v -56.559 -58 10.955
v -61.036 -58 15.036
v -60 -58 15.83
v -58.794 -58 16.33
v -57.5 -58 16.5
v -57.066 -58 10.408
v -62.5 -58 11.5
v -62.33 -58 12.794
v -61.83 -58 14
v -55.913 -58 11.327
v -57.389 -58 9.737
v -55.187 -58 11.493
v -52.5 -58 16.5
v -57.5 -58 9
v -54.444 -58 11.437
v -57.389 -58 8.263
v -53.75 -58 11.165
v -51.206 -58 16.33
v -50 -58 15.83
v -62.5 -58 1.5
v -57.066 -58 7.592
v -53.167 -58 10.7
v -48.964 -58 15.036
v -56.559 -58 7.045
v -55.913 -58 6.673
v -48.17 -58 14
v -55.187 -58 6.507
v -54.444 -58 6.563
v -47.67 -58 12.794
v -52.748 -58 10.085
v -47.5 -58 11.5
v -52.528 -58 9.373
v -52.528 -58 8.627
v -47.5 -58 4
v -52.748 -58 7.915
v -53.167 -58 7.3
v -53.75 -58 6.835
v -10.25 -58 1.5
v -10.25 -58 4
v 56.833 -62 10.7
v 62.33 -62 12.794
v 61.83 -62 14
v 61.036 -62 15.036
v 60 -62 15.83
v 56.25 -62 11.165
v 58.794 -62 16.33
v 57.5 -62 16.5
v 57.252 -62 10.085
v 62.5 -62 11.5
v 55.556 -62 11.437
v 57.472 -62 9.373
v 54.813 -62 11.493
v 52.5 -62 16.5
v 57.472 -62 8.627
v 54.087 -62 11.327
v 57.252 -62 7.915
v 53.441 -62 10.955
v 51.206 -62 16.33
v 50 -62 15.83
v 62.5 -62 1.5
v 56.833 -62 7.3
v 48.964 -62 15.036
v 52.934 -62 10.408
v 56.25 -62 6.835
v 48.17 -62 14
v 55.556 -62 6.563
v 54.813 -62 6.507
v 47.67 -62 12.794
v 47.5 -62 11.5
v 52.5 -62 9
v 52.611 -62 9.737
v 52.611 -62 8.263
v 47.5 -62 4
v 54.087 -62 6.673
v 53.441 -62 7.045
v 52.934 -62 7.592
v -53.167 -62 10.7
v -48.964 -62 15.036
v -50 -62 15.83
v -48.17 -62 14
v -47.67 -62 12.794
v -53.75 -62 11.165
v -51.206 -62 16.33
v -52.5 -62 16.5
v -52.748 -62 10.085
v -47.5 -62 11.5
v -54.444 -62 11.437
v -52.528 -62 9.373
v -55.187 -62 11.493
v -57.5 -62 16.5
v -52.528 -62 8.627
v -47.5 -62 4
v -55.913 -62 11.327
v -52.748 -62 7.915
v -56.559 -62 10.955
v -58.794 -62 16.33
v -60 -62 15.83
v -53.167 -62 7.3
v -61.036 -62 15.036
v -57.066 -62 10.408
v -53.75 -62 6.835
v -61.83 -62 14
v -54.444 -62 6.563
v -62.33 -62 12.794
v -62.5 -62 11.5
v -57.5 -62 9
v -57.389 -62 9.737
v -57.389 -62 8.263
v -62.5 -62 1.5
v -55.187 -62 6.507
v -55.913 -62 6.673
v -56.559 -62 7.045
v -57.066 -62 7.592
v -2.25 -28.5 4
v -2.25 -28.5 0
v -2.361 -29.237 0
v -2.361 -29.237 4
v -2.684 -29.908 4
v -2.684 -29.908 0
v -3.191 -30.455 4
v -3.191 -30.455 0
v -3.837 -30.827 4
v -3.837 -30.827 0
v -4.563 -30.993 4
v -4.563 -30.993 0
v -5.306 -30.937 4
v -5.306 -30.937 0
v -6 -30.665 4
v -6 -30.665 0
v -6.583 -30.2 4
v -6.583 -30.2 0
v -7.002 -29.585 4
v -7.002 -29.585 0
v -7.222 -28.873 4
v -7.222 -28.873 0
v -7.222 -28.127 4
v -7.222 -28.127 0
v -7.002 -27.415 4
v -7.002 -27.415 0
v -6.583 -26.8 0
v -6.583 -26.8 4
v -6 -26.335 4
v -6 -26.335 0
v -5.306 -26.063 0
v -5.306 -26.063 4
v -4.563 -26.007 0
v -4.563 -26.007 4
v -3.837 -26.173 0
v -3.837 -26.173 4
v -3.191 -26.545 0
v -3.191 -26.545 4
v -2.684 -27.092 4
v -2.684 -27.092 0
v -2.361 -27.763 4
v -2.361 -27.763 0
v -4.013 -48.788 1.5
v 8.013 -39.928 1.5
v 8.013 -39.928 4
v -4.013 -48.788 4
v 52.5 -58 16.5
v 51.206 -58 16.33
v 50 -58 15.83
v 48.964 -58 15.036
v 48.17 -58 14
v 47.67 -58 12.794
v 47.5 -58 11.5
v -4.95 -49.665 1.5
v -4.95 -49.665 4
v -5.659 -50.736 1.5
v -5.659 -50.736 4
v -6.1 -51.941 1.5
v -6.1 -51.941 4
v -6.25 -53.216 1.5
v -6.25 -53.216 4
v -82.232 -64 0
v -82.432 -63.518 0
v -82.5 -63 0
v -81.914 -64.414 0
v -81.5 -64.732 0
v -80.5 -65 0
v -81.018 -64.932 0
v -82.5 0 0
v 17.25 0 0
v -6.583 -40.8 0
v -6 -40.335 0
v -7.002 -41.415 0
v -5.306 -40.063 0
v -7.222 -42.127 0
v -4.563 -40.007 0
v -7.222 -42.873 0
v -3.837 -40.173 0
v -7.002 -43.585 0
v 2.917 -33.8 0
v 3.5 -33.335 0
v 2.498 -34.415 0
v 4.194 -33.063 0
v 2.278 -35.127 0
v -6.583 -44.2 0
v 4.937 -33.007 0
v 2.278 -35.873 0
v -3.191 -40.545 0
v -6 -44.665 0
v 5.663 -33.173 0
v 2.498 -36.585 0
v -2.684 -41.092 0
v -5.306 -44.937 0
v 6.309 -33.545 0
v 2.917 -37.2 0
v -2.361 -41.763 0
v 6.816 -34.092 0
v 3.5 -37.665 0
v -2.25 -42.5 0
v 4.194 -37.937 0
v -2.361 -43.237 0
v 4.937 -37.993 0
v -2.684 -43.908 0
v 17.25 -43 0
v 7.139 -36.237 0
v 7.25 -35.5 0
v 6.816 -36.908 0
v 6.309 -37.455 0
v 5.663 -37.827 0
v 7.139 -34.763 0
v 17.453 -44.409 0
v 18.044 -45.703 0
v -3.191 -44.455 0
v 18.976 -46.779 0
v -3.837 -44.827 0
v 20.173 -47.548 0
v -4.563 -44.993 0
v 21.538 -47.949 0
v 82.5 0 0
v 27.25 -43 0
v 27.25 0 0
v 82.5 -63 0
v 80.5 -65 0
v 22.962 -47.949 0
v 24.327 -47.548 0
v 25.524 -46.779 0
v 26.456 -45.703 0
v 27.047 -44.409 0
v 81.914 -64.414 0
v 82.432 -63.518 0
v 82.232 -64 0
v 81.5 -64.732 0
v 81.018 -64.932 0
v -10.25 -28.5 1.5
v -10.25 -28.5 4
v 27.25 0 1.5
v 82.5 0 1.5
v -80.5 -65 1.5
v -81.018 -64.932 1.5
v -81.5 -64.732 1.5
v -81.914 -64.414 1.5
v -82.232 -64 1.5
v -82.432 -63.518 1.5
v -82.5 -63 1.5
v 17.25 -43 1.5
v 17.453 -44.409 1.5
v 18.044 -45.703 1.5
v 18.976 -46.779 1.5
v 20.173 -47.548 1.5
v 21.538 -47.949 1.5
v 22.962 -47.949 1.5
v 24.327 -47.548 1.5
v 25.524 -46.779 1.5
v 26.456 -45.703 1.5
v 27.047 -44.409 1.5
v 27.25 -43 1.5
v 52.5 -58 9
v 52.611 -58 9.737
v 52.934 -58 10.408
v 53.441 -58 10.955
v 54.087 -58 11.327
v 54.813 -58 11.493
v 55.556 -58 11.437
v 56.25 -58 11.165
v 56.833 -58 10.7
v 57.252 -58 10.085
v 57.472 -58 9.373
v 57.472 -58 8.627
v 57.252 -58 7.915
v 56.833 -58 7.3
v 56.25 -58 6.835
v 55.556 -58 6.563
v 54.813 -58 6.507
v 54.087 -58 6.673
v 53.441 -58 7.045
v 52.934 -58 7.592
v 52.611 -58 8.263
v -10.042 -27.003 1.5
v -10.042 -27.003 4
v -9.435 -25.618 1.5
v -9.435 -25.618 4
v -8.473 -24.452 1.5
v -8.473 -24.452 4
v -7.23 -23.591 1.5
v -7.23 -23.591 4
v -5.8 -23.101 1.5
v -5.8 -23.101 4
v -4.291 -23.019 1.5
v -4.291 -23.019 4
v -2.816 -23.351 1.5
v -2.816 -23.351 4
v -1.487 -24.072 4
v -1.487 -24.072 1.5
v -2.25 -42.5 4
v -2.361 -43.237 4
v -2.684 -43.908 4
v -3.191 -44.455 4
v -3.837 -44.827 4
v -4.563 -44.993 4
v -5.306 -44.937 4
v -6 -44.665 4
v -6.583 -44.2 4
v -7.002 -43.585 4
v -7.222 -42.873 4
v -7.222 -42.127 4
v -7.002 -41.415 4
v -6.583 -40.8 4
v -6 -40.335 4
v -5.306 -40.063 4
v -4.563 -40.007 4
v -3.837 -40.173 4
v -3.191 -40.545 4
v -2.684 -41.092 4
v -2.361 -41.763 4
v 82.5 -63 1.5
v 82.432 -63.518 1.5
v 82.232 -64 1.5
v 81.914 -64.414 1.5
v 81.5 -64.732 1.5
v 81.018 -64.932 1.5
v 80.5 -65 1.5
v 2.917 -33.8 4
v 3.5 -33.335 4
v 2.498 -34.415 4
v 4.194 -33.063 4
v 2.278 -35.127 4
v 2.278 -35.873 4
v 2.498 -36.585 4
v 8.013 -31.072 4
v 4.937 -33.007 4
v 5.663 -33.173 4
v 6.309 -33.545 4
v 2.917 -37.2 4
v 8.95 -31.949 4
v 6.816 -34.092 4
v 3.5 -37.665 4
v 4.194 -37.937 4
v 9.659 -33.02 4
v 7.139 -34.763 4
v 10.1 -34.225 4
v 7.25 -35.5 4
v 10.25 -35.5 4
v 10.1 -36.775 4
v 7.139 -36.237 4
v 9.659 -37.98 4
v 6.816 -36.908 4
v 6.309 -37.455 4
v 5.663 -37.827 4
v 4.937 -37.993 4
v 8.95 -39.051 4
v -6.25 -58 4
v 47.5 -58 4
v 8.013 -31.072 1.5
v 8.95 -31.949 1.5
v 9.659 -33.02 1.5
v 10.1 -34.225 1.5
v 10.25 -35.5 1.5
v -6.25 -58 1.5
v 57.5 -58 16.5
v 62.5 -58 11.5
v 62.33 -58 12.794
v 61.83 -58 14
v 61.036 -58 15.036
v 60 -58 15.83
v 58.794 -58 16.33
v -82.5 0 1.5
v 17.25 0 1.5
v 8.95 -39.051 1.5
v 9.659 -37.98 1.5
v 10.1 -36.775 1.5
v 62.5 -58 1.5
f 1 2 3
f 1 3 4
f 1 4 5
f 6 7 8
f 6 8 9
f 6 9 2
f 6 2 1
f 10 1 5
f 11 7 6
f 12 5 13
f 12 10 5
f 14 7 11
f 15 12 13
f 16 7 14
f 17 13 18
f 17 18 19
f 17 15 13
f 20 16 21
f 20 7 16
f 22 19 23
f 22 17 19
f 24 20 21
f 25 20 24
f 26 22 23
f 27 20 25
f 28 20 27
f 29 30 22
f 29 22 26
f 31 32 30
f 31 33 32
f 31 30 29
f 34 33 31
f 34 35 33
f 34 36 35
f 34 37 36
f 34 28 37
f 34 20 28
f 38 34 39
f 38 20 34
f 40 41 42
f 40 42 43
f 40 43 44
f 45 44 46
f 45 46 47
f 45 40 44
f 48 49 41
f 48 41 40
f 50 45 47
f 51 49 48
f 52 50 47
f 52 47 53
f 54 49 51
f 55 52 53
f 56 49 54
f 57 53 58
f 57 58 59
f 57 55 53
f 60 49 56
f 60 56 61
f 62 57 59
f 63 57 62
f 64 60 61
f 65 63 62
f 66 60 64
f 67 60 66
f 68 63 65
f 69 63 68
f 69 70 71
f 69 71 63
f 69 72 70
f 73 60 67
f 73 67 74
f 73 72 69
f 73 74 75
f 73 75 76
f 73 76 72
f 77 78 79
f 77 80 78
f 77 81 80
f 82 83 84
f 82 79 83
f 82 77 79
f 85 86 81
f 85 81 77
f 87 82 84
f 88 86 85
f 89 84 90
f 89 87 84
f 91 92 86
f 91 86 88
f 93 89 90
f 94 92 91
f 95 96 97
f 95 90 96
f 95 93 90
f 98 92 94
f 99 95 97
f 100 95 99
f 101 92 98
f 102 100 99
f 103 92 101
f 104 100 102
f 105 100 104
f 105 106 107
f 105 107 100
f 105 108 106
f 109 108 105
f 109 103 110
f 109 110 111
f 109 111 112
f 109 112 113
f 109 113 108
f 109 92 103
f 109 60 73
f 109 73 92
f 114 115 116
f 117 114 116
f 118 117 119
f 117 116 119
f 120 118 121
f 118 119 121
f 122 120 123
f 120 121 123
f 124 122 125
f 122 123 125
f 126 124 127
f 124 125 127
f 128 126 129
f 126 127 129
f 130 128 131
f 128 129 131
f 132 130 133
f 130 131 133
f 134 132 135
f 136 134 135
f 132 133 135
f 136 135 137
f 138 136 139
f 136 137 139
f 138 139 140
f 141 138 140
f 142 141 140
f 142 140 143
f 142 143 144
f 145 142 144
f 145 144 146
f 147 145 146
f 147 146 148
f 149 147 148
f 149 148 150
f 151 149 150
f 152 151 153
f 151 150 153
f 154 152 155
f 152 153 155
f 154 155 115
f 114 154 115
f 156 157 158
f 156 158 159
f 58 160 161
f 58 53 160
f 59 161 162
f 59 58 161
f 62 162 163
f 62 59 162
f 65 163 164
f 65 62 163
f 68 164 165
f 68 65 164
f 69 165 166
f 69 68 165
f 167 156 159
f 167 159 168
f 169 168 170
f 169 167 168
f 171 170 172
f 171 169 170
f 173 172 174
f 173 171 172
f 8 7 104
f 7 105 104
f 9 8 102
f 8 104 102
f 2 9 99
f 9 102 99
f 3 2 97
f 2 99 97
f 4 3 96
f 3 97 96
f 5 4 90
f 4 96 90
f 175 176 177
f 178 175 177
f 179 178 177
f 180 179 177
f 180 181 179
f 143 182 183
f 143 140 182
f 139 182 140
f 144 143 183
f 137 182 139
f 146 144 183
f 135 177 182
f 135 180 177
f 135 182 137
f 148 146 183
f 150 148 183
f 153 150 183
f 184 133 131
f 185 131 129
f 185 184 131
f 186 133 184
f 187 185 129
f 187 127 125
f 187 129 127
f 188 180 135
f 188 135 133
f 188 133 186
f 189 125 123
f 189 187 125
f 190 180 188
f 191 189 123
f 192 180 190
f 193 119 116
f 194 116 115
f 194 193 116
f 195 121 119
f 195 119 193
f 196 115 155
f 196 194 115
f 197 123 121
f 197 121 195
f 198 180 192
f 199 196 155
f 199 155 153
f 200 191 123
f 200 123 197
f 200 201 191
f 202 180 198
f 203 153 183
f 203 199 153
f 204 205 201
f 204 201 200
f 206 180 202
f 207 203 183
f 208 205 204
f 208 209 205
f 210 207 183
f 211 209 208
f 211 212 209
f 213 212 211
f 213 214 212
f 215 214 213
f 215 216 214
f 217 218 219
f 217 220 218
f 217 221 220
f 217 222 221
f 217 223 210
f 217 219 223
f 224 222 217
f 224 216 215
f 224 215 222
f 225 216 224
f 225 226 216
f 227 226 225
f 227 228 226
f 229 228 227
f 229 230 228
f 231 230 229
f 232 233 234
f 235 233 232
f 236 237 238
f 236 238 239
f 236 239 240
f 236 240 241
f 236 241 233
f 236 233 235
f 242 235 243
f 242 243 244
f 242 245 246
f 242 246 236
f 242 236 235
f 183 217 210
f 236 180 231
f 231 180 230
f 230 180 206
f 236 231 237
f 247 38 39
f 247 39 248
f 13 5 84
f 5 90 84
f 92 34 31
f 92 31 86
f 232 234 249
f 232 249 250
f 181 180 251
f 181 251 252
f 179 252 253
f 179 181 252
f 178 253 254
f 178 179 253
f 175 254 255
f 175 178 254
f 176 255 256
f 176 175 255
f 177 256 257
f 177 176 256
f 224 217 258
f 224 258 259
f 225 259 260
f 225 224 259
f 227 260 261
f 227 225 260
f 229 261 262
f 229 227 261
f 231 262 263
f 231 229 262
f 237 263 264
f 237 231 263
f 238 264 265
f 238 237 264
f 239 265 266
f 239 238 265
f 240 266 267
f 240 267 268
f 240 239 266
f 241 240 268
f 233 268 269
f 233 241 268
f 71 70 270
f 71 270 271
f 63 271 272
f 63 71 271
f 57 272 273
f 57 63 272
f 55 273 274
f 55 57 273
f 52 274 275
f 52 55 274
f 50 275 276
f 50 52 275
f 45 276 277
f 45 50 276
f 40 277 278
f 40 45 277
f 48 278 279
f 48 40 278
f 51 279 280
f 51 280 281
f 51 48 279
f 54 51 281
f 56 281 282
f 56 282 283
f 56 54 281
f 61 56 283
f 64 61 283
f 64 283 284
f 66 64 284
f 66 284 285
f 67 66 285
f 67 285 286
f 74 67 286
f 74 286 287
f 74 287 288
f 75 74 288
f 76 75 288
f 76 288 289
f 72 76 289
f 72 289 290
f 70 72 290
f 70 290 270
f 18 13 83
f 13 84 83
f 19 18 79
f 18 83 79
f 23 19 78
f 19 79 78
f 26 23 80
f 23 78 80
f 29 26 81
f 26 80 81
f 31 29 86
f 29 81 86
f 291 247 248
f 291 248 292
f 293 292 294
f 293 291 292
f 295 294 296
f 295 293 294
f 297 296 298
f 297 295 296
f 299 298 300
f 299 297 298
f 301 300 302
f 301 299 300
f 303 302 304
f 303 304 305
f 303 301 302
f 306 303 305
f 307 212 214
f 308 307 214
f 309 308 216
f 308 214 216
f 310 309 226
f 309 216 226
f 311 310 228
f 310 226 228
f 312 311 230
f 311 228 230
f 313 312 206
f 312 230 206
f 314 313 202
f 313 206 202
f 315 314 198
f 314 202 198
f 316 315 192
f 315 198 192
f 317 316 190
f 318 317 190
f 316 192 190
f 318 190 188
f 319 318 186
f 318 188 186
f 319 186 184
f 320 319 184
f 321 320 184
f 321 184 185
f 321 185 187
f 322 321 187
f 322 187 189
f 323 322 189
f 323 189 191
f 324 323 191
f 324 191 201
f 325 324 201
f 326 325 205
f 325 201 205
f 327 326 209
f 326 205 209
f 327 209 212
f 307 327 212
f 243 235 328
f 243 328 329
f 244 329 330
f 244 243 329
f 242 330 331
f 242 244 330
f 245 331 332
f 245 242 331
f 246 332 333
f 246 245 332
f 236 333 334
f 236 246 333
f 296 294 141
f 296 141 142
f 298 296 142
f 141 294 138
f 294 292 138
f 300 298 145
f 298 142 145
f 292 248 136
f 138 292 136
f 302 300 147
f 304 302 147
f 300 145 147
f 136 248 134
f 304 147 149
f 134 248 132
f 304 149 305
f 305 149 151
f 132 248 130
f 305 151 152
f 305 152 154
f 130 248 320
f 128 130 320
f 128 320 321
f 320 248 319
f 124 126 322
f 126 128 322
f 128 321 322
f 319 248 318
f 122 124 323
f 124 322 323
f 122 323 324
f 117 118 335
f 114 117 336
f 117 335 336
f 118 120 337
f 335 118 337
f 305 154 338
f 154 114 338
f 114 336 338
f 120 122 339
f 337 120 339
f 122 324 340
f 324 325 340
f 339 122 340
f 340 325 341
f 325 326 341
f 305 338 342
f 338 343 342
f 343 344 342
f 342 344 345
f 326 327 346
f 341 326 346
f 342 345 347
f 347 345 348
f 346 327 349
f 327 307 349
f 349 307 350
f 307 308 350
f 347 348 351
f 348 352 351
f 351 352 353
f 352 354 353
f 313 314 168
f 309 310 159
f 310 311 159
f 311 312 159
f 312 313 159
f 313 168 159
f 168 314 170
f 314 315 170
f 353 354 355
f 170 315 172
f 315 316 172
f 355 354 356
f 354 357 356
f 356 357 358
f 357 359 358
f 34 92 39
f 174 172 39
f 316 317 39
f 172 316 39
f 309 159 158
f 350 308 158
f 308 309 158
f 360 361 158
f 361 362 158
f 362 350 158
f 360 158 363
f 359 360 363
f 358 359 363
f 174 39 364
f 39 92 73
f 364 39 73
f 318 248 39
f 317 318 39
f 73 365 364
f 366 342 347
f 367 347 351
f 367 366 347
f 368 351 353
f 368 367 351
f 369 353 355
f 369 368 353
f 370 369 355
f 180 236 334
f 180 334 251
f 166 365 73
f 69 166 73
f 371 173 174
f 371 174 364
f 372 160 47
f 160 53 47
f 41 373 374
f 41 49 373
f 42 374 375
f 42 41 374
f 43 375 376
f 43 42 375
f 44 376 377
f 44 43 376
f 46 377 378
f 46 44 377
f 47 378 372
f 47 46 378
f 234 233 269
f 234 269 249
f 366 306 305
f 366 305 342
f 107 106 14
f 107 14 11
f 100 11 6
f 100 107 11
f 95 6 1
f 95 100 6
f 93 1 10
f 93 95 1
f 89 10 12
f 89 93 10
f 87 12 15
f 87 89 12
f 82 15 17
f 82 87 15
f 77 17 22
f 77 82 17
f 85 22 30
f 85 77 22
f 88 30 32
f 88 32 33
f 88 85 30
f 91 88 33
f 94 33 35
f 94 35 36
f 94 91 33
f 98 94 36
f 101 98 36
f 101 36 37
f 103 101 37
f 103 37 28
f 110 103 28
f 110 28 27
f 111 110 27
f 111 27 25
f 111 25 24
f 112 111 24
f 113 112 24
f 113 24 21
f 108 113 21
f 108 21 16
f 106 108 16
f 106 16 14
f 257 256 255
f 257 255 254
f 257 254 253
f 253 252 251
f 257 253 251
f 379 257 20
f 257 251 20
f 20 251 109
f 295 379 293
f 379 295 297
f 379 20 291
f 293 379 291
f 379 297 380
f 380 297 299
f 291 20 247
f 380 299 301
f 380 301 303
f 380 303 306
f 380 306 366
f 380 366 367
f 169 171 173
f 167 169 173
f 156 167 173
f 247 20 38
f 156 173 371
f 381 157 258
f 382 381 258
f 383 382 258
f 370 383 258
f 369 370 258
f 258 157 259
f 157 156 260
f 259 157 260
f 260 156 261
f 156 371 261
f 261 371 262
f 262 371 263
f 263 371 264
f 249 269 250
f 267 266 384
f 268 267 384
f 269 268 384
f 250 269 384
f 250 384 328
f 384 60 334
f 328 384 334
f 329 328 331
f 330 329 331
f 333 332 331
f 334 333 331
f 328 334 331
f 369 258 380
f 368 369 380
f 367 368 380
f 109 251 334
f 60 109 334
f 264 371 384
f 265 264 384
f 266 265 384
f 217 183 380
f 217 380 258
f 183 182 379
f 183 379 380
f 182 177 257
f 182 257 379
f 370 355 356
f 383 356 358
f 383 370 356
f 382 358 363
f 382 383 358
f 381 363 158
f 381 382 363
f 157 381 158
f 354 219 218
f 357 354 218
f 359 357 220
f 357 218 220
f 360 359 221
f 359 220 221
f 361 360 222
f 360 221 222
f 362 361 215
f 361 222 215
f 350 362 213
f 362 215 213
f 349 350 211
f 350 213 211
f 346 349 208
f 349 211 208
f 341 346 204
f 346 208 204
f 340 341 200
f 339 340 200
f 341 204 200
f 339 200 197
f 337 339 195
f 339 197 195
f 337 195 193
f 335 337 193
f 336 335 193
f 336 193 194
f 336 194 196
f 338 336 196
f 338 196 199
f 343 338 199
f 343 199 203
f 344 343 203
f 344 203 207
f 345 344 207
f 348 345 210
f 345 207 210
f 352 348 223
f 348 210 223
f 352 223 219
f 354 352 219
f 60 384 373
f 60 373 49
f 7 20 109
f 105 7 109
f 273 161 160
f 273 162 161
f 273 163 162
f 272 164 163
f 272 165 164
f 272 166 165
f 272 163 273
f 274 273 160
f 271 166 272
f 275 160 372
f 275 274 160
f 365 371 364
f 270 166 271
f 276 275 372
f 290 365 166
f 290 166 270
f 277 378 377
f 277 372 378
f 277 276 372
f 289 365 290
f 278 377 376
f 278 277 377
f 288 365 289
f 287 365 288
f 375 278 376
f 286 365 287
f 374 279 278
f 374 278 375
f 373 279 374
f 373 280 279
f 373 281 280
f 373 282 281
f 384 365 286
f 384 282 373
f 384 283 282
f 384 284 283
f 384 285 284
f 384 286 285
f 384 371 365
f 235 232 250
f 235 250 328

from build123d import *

# Parameters (mm, degrees)
F2_DEPTH  = 1.5
F1_W      = 15
F1_H      = 4
F3_DEPTH  = 16.5
F1_R      = 2.5
F4_DEPTH  = 4
F5_R      = 2.5
F6_DEPTH  = 62.001
F7_R      = 5
F10_ANGLE = 180


with BuildPart() as f2:
    # F1 (on Top) → F2 (new body)
    with BuildSketch(Plane.XY):
        with BuildLine():
            Line((-82.5, 63), (-82.5, 0))
            Line((-82.5, 0), (17.25, 0))
            Line((17.25, 0), (17.25, 43))
            ThreePointArc((17.25, 43), (22.25, 48), (27.25, 43))
            Line((27.25, 43), (27.25, 0))
            Line((27.25, 0), (82.5, 0))
            Line((82.5, 0), (82.5, 63))
            ThreePointArc((82.5, 63), (81.9142135624, 64.4142135624), (80.5, 65))
            Line((80.5, 65), (-80.5, 65))
            ThreePointArc((-80.5, 65), (-81.9142135624, 64.4142135624), (-82.5, 63))
        make_face()
        with BuildLine():
            Line((-62.5, 58), (-62.5, 62))
            Line((-62.5, 62), (-47.5, 62))
            Line((-47.5, 62), (47.5, 62))
            Line((47.5, 62), (62.5, 62))
            Line((62.5, 62), (62.5, 58))
            Line((62.5, 58), (47.5, 58))
            Line((47.5, 58), (-6.25, 58))
            Line((-6.25, 58), (-6.25, 53.2162800982))
            ThreePointArc((-6.25, 53.2162800982), (-5.6588833201, 50.735783263), (-4.0125947093, 48.7884729928))
            Line((-4.0125947093, 48.7884729928), (8.0125947093, 39.9278071054))
            ThreePointArc((8.0125947093, 39.9278071054), (9.6588833201, 37.9804968352), (10.25, 35.5))
            ThreePointArc((10.25, 35.5), (9.6588833201, 33.0195031648), (8.0125947093, 31.0721928946))
            Line((8.0125947093, 31.0721928946), (-1.4874052907, 24.0721928946))
            ThreePointArc((-1.4874052907, 24.0721928946), (-7.2304968352, 23.5911166799), (-10.25, 28.5))
            Line((-10.25, 28.5), (-10.25, 58))
            Line((-10.25, 58), (-47.5, 58))
            Line((-47.5, 58), (-62.5, 58))
        make_face(mode=Mode.SUBTRACT)
    extrude(amount=F2_DEPTH)

    # F1 (on Top) → F3 (join)
    with BuildSketch(Plane.XY):
        with Locations((-55, 60)):
            Rectangle(F1_W, F1_H)
        with Locations((55, 60)):
            Rectangle(F1_W, F1_H)
    extrude(amount=F3_DEPTH)

    # F1 (on Top) → F4 (join)
    with BuildSketch(Plane.XY):
        Polygon((47.5, 62), (-47.5, 62), (-47.5, 58), (-10.25, 58), (-6.25, 58), (47.5, 58), align=None)
        with BuildLine():
            Line((-6.25, 58), (-10.25, 58))
            Line((-10.25, 58), (-10.25, 28.5))
            ThreePointArc((-10.25, 28.5), (-7.2304968352, 23.5911166799), (-1.4874052907, 24.0721928946))
            Line((-1.4874052907, 24.0721928946), (8.0125947093, 31.0721928946))
            ThreePointArc((8.0125947093, 31.0721928946), (9.6588833201, 33.0195031648), (10.25, 35.5))
            ThreePointArc((10.25, 35.5), (9.6588833201, 37.9804968352), (8.0125947093, 39.9278071054))
            Line((8.0125947093, 39.9278071054), (-4.0125947093, 48.7884729928))
            ThreePointArc((-4.0125947093, 48.7884729928), (-5.6588833201, 50.735783263), (-6.25, 53.2162800982))
            Line((-6.25, 53.2162800982), (-6.25, 58))
        make_face()
        with Locations((-4.75, 28.5)):
            Circle(F1_R, mode=Mode.SUBTRACT)
        with Locations((-4.75, 42.5)):
            Circle(F1_R, mode=Mode.SUBTRACT)
        with Locations((4.75, 35.5)):
            Circle(F1_R, mode=Mode.SUBTRACT)
    extrude(amount=F4_DEPTH)

    # F5 (on face) → F6 (cut, through all)
    with BuildSketch(Plane(origin=(0, 62, 0), x_dir=(-1, 0, 0), z_dir=(0, 1, 0))):
        with Locations((55, 9)):
            Circle(F5_R)
        with Locations((-55, 9)):
            Circle(F5_R)
    extrude(amount=-F6_DEPTH, mode=Mode.SUBTRACT)

    # F7
    f7_edges = [f2.edges().sort_by_distance(p)[0] for p in [
        (-62.5, 60, 16.5),
        (-47.5, 60, 16.5),
        (47.5, 60, 16.5),
        (62.5, 60, 16.5),
    ]]
    fillet(f7_edges, radius=F7_R)


with BuildPart() as f8_1:
    # F8: instance of F2
    add(f2.part.mirror(Plane.XY))


with BuildPart() as f8_1_1:
    # F10: moved
    add(f8_1.part.rotate(Axis((-32.625, 0, 0), (1, 0, 0)), F10_ANGLE))


solid = f8_1_1.part
